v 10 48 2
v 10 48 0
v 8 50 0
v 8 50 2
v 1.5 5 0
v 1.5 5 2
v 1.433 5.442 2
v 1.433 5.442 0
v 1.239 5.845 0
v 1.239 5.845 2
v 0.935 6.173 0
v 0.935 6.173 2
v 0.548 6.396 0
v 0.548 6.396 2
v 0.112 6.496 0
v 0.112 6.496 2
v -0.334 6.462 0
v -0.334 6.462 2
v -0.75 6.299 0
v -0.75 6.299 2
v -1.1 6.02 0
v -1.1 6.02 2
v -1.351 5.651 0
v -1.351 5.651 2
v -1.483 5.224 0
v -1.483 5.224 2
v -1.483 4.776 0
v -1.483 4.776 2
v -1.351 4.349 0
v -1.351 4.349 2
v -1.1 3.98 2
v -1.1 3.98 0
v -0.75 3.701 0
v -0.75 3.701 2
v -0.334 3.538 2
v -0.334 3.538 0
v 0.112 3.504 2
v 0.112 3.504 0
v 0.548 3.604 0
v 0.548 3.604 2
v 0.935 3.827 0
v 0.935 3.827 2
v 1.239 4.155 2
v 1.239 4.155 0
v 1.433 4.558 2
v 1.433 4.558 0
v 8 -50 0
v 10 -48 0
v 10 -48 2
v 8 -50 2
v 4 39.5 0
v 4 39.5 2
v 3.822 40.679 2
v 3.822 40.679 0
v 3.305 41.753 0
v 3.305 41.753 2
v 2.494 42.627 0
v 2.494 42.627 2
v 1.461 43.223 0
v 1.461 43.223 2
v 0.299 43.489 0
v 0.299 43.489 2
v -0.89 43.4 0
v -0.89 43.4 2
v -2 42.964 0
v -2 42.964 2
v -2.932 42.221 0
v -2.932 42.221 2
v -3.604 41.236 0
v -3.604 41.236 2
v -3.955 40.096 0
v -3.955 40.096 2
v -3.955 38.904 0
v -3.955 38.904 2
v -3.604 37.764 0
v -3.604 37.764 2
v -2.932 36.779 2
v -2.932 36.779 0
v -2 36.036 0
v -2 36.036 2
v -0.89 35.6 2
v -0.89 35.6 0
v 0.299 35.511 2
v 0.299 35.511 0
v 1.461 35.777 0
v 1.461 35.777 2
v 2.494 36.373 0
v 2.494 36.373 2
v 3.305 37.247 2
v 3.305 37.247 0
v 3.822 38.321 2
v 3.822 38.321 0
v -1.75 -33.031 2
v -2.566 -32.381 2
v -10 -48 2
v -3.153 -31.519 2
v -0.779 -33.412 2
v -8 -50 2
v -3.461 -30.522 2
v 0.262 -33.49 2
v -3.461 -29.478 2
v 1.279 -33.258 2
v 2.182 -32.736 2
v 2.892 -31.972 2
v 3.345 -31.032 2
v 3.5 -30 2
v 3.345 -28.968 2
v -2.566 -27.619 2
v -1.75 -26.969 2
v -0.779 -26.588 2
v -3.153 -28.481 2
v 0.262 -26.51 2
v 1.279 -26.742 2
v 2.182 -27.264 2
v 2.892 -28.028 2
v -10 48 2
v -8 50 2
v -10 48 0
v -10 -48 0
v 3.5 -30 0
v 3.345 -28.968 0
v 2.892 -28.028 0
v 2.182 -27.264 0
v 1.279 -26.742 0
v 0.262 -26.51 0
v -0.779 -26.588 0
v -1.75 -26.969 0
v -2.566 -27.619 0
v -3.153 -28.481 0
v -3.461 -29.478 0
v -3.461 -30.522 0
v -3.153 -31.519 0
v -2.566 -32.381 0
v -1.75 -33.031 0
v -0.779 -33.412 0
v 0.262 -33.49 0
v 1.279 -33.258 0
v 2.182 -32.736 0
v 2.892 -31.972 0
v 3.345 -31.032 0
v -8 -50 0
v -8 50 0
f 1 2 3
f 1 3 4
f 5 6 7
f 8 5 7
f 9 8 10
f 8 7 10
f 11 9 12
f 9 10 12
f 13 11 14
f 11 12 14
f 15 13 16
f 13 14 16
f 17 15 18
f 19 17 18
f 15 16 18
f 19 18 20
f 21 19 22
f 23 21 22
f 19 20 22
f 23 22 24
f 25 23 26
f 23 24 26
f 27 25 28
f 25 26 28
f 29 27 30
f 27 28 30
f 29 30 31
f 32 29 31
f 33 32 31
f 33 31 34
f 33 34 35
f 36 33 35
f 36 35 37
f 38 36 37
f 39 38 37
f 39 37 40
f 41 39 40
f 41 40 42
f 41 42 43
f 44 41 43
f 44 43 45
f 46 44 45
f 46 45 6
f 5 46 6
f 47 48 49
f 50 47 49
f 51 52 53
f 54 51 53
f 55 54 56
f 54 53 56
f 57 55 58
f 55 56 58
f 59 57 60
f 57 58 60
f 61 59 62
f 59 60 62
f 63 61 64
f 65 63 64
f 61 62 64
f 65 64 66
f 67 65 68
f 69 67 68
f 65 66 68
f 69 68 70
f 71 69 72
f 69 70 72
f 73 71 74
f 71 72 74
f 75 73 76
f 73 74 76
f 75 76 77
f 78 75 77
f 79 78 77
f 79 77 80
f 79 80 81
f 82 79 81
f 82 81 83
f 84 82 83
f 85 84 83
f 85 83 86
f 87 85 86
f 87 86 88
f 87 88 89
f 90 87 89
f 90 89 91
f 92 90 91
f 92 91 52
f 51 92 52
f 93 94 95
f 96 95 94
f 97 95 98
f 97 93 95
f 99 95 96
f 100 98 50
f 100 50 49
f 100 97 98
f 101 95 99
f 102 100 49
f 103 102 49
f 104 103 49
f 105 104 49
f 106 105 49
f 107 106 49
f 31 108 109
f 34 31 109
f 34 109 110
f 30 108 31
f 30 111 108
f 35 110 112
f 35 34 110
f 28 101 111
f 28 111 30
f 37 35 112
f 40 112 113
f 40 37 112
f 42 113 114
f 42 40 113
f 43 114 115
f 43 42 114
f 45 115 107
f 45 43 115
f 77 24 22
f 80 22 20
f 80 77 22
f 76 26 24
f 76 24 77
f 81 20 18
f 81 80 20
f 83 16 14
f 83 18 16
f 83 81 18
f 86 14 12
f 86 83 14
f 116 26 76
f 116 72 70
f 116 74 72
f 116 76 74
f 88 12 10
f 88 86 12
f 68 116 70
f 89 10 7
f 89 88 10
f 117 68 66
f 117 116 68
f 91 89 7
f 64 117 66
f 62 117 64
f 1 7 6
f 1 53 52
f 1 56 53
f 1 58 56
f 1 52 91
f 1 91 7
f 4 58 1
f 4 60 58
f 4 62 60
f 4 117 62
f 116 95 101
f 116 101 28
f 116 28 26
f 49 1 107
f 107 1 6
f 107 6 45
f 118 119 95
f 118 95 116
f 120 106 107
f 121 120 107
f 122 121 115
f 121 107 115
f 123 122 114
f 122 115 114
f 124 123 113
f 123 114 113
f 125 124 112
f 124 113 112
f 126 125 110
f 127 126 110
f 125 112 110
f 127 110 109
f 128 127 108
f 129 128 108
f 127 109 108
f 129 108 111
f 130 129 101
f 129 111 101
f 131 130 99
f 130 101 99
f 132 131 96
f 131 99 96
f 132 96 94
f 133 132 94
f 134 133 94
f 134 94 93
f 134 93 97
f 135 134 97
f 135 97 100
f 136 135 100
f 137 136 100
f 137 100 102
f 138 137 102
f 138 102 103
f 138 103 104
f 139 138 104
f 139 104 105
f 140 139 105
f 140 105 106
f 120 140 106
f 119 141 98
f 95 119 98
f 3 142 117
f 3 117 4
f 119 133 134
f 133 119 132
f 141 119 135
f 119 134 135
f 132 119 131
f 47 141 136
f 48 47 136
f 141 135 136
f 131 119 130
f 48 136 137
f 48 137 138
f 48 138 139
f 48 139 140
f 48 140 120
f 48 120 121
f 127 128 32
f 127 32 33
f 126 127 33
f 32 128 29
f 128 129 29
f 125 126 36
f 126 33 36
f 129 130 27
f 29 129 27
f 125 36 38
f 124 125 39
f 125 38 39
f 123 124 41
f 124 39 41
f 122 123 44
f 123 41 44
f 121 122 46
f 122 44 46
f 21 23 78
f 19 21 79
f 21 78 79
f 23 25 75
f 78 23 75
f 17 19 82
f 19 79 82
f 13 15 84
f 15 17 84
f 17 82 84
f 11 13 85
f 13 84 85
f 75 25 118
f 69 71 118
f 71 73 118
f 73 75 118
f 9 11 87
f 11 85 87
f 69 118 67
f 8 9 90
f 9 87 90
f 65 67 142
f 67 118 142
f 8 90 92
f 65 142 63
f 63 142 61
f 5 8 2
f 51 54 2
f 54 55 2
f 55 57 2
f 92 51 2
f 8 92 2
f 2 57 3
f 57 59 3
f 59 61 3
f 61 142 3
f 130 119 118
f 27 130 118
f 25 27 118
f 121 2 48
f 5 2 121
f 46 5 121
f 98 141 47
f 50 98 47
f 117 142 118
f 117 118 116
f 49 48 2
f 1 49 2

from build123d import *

# Parameters (mm, degrees)
SKETCH1_W           = 20
SKETCH1_H           = 100
BOSS_EXTRUDE1_DEPTH = 2
CUT_EXTRUDE1_REACH  = 53.029
SKETCH2_R           = 4
SKETCH2_R_2         = 1.5
SKETCH2_R_3         = 3.5
CHAMFER1_SIZE       = 2


with BuildPart() as part:
    # Sketch1 → Boss-Extrude1 (new body)
    with BuildSketch(Plane.XY):
        Rectangle(SKETCH1_W, SKETCH1_H)
    extrude(amount=BOSS_EXTRUDE1_DEPTH)

    # Sketch2 → Cut-Extrude1 (cut, up to next)
    with BuildSketch(Plane.XY.offset(2), mode=Mode.PRIVATE) as cut_extrude1_sk1:
        with Locations((0, 39.5)):
            Circle(SKETCH2_R)
    cut_extrude1_tool1 = extrude(cut_extrude1_sk1.sketch, amount=-CUT_EXTRUDE1_REACH, mode=Mode.PRIVATE) & part.part
    # Sketch2 → Cut-Extrude1 (cut, up to next)
    with BuildSketch(Plane.XY.offset(2), mode=Mode.PRIVATE) as cut_extrude1_sk2:
        with Locations((0, 5)):
            Circle(SKETCH2_R_2)
    cut_extrude1_tool2 = extrude(cut_extrude1_sk2.sketch, amount=-CUT_EXTRUDE1_REACH, mode=Mode.PRIVATE) & part.part
    # Sketch2 → Cut-Extrude1 (cut, up to next)
    with BuildSketch(Plane.XY.offset(2), mode=Mode.PRIVATE) as cut_extrude1_sk3:
        with Locations((0, -30)):
            Circle(SKETCH2_R_3)
    cut_extrude1_tool3 = extrude(cut_extrude1_sk3.sketch, amount=-CUT_EXTRUDE1_REACH, mode=Mode.PRIVATE) & part.part
    add(cut_extrude1_tool1.solids().sort_by_distance((0, 39.5, 2))[0], mode=Mode.SUBTRACT)
    add(cut_extrude1_tool2.solids().sort_by_distance((0, 5, 2))[0], mode=Mode.SUBTRACT)
    add(cut_extrude1_tool3.solids().sort_by_distance((0, -30, 2))[0], mode=Mode.SUBTRACT)

    # Chamfer1
    chamfer1_edges = [part.edges().sort_by_distance(p)[0] for p in [
        (10, -50, 1),
        (-10, -50, 1),
        (-10, 50, 1),
        (10, 50, 1),
    ]]
    chamfer(chamfer1_edges, length=CHAMFER1_SIZE)


solid = part.part
